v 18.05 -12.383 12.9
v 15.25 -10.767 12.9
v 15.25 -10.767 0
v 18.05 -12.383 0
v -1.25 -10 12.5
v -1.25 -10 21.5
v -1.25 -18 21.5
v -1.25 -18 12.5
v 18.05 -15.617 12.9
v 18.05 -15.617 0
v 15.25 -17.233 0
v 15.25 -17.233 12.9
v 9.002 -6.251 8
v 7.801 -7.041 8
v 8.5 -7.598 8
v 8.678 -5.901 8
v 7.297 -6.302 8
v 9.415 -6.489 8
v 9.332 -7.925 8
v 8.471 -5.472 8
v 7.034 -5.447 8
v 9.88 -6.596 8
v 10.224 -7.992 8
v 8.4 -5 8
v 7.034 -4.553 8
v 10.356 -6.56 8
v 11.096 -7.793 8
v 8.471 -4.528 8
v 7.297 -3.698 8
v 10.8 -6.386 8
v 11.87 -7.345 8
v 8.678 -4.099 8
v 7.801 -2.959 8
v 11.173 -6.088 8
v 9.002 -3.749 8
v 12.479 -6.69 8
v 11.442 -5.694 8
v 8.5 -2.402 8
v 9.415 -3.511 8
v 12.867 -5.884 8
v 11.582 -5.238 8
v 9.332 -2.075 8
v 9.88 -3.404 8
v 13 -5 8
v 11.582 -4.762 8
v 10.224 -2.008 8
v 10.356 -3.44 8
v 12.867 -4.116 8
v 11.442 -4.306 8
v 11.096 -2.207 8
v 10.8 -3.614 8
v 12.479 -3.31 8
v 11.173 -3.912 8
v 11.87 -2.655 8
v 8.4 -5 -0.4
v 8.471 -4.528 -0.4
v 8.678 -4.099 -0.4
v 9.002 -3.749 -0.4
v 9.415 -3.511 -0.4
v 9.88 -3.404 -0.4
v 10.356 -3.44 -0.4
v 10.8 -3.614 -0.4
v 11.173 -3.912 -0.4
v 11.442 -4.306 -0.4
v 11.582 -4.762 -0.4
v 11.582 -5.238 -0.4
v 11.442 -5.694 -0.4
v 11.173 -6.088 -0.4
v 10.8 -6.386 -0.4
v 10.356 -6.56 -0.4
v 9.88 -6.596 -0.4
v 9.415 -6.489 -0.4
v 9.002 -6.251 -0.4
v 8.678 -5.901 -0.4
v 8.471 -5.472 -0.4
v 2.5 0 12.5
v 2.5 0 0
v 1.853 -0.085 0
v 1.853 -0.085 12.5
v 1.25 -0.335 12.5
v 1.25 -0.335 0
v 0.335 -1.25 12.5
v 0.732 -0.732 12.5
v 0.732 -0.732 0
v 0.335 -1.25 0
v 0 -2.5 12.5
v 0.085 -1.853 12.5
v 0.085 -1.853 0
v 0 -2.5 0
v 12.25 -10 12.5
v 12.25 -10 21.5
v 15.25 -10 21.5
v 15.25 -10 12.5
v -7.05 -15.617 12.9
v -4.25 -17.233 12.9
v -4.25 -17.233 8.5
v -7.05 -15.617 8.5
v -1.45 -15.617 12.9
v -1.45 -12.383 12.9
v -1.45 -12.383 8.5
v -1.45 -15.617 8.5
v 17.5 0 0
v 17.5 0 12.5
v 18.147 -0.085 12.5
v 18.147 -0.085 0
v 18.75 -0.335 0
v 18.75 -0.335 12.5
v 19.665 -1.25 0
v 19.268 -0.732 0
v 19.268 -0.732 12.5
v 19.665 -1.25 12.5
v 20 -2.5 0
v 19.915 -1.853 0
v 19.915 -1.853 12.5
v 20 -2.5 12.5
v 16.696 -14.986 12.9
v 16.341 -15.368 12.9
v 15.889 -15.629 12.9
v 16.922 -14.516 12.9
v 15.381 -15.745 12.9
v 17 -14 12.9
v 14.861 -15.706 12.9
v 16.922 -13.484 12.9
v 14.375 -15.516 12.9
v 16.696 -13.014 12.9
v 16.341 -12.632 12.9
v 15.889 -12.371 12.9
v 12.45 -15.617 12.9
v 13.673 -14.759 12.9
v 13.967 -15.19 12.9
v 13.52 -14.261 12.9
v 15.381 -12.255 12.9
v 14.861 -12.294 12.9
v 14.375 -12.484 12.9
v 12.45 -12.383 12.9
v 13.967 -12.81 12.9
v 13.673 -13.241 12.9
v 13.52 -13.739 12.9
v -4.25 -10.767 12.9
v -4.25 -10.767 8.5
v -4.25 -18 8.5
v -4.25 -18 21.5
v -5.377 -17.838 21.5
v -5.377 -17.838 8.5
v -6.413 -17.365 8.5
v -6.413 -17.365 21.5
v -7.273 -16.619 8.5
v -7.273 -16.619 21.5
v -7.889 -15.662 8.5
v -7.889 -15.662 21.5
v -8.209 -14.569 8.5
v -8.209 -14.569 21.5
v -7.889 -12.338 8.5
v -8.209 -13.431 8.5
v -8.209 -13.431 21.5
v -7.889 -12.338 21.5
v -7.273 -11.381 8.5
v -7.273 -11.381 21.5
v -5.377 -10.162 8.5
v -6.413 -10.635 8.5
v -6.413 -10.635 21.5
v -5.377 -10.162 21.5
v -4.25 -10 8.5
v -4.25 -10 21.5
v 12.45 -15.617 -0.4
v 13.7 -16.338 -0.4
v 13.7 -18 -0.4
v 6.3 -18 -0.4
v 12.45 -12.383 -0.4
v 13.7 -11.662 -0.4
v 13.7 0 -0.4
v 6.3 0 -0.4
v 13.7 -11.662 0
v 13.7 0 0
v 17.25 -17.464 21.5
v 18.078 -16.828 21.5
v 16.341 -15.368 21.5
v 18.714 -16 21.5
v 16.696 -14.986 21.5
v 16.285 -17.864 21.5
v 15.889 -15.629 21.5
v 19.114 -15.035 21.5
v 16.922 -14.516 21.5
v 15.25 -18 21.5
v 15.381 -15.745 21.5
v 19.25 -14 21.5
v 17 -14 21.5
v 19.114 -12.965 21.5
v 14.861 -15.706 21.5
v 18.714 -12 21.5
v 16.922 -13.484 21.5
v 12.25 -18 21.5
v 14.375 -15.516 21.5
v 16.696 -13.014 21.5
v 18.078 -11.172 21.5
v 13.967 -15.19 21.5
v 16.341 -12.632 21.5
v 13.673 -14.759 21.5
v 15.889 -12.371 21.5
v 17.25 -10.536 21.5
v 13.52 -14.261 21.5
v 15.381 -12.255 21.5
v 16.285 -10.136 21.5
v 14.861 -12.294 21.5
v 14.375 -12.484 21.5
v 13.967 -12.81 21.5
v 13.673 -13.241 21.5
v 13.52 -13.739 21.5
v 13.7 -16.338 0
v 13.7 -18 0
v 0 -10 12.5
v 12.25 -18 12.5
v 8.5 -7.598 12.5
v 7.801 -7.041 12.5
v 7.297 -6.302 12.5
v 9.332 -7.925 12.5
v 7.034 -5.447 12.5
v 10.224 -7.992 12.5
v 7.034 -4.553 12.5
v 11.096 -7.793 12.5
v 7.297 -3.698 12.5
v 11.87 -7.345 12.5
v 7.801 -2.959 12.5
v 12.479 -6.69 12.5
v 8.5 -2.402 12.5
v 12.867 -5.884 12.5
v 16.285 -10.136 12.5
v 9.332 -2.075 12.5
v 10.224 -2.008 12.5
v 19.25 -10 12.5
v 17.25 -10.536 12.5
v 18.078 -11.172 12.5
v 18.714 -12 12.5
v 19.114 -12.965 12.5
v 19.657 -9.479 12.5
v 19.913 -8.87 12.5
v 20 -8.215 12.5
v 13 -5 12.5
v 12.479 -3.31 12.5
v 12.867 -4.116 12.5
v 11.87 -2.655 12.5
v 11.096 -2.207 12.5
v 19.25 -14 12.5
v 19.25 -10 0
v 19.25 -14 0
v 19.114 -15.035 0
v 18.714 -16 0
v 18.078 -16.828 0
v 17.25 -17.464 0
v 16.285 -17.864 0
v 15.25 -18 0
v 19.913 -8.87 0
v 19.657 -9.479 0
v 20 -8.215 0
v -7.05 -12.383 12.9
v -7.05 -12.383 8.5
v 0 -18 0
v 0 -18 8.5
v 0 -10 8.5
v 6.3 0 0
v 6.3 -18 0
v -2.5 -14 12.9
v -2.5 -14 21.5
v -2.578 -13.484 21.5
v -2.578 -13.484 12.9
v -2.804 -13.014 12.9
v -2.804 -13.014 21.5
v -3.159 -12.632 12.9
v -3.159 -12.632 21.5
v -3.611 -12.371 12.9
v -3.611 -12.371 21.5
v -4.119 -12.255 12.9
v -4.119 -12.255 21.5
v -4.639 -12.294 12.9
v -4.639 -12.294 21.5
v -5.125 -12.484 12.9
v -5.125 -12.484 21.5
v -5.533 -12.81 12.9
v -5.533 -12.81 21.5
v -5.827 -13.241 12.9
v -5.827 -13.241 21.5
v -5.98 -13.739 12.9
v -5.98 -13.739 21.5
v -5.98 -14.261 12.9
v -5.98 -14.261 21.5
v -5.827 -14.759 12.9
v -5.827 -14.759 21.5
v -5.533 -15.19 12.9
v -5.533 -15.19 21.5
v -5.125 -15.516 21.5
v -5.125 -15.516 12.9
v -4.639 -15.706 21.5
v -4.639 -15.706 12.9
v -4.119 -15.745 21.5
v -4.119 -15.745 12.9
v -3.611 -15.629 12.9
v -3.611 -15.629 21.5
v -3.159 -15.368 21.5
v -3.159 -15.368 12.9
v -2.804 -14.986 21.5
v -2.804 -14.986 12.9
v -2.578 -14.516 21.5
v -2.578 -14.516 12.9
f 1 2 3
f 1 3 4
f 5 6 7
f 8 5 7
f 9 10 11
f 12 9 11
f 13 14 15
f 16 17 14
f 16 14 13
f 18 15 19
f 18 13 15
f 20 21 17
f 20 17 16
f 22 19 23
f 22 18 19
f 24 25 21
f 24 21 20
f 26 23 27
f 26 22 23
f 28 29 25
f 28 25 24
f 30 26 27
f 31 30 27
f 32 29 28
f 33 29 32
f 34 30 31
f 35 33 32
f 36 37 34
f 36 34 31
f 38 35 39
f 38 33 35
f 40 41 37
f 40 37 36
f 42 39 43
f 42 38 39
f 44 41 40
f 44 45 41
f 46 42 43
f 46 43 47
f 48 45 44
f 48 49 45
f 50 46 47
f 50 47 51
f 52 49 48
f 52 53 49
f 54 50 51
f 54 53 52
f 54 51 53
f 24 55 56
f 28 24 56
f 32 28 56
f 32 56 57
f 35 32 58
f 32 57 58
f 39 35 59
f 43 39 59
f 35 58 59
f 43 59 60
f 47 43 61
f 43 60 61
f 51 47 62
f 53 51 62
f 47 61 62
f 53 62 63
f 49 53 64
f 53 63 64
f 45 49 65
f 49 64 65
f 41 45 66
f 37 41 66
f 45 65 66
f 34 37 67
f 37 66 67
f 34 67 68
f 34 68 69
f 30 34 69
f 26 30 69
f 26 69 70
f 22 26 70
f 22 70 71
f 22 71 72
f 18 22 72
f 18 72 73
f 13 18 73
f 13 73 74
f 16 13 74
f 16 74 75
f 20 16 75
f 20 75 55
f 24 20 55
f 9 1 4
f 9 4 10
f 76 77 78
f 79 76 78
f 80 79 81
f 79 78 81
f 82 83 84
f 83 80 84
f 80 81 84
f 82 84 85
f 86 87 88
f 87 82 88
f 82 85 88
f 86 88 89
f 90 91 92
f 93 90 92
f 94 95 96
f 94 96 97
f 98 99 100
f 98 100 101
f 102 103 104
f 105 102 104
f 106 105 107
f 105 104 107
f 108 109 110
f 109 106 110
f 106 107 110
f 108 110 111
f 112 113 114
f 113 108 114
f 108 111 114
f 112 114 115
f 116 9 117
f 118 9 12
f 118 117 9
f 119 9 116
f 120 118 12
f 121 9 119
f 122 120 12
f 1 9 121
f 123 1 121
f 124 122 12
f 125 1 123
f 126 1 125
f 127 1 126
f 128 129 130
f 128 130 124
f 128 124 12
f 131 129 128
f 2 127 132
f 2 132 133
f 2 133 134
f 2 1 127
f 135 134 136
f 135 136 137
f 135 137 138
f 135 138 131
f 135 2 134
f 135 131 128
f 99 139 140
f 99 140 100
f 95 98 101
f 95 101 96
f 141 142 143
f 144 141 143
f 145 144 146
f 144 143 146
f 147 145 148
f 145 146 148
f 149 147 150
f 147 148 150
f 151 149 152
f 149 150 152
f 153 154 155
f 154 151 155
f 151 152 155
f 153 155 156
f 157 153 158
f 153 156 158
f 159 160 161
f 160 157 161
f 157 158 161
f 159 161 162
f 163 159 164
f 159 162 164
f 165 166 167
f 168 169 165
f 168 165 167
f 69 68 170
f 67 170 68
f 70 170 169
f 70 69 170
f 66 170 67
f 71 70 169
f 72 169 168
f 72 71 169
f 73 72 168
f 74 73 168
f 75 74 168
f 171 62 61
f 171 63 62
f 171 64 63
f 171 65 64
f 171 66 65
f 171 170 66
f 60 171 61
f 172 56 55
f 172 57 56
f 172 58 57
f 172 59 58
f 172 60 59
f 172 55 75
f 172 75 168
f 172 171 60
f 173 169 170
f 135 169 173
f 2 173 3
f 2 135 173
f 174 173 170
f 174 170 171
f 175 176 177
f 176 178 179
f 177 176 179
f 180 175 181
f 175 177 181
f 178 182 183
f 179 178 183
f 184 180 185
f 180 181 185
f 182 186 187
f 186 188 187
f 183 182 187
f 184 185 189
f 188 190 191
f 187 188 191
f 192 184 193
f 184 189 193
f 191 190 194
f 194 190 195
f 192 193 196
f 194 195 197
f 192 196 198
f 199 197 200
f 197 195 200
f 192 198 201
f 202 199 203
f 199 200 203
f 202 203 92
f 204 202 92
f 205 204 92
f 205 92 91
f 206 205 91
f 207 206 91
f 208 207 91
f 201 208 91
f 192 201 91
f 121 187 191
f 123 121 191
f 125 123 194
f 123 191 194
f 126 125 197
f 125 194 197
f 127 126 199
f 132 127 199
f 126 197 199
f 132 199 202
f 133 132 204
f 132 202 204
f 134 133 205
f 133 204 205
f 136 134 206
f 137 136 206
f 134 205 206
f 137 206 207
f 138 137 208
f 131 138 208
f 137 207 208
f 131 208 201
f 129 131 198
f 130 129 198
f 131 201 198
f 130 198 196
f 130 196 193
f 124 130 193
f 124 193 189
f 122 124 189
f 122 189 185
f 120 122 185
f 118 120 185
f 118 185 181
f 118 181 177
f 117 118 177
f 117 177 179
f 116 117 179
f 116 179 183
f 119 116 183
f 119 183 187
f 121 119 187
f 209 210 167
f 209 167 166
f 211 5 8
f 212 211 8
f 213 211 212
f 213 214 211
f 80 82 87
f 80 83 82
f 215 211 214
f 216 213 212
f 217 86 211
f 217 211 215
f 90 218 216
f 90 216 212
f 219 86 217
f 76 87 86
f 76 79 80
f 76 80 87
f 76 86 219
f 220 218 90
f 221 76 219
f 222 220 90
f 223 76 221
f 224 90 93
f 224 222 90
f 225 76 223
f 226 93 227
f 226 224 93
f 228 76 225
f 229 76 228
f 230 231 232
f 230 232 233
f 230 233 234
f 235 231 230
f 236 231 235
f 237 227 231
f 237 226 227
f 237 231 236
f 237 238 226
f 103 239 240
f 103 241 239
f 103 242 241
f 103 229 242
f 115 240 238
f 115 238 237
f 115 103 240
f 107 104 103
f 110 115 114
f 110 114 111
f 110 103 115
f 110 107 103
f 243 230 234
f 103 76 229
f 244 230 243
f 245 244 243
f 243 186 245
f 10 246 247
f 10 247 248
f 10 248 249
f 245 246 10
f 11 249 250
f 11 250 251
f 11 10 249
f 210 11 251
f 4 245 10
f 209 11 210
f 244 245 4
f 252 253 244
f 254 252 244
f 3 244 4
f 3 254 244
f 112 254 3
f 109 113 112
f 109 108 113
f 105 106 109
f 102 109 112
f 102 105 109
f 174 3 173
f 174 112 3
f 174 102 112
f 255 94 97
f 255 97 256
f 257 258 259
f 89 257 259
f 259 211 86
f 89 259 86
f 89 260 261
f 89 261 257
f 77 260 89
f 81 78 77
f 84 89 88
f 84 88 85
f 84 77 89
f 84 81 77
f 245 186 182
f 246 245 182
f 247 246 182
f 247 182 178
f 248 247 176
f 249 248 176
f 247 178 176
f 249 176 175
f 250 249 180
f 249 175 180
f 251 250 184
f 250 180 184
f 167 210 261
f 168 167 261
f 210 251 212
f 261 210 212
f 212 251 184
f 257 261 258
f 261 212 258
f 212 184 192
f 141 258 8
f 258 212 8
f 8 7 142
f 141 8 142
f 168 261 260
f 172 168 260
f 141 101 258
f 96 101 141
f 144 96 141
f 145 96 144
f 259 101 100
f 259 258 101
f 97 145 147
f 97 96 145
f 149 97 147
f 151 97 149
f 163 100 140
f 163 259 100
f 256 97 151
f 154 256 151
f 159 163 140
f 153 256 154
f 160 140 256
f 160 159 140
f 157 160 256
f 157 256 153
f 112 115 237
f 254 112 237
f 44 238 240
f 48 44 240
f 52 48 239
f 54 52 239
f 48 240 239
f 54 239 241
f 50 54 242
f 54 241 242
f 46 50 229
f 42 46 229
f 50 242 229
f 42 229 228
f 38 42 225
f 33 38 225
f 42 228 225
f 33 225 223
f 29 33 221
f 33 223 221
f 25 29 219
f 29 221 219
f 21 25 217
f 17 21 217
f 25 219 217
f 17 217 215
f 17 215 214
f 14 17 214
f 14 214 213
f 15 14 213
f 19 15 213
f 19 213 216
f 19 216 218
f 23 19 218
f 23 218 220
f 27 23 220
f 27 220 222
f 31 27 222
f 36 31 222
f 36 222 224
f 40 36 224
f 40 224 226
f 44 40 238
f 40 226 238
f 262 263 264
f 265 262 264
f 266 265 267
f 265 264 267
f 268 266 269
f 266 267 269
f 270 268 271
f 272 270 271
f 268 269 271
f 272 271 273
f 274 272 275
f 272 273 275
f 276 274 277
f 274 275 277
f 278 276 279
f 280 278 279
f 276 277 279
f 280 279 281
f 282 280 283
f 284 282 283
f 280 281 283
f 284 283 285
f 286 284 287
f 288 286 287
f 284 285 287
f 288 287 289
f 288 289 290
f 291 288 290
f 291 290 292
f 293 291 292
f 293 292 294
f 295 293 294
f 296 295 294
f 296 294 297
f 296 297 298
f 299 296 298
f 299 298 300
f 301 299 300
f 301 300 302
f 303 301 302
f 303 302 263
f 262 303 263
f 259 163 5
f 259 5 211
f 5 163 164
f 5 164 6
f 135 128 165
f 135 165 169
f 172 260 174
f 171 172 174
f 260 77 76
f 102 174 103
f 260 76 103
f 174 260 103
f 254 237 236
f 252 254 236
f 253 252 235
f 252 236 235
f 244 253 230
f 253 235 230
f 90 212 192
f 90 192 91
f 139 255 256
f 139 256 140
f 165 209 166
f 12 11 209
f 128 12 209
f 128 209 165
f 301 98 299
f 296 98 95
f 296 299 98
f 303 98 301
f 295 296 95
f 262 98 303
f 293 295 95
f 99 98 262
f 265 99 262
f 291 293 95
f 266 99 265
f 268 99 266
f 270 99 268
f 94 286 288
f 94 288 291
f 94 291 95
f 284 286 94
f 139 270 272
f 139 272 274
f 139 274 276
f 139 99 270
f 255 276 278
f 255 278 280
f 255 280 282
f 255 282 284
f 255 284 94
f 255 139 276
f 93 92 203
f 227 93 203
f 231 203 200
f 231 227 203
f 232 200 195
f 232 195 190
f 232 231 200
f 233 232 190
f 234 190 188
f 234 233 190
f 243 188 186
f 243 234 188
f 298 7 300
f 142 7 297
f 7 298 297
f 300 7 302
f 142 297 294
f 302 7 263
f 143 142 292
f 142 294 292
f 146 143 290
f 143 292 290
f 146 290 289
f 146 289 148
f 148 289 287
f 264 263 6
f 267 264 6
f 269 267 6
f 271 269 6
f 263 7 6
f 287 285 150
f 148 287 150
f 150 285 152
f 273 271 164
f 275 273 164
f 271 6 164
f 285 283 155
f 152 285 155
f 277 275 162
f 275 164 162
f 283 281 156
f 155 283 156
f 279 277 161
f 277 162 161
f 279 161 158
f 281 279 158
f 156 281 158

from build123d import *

# Parameters (mm, degrees)
SKETCH_1_W               = 20
SKETCH_1_H               = 10
EXTRUDE_1_DEPTH          = 8.5
EXTRUDE_3_DEPTH          = 8.5
EXTRUDE_3_DEPTH_BACK     = 13
CUT_EXTRUDE_1_DEPTH      = 9
SKETCH_11_W              = 7.4
SKETCH_11_H              = 18
EXTRUDE_5_DEPTH          = 0.4
SKETCH_14_W              = 13
SKETCH_14_H              = 8.5
CUT_EXTRUDE_7_DEPTH      = 8
SKETCH_6_R               = 1.75
CUT_EXTRUDE_2_DEPTH      = 12.8
CUT_EXTRUDE_3_DEPTH      = 35.441980199
CUT_EXTRUDE_3_DEPTH_BACK = 12.9
SKETCH_15_W              = 3.5
SKETCH_15_H              = 8
CUT_EXTRUDE_8_DEPTH      = 8.5
SKETCH_12_R              = 1.6
CUT_EXTRUDE_4_DEPTH      = 35.693082884
SKETCH_13_R              = 3
CUT_EXTRUDE_5_DEPTH      = 4.5
FILLET_1_R               = 2.5
FILLET_2_R               = 4


# Some blends are built 0.0001 mm under size
with BuildPart() as part:
    # Эскиз1 → Бобышка-Вытянуть1 (new body)
    with BuildSketch(Plane.XY):
        with Locations((10, -5)):
            Rectangle(SKETCH_1_W, SKETCH_1_H)
    extrude(amount=EXTRUDE_1_DEPTH)

    # Эскиз4 → Бобышка-Вытянуть3 (add, two sides: drawn at the far end of the back side and taken through both)
    with BuildSketch(Plane(origin=(0, 0, 8.5), x_dir=(-1, 0, 0), z_dir=(0, 0, -1)).offset(-EXTRUDE_3_DEPTH_BACK)):
        with BuildLine():
            Line((4.25, -10), (0, -10))
            Line((0, -10), (0, 0))
            Line((0, 0), (-20, 0))
            Line((-20, 0), (-20, -10))
            Line((-20, -10), (-19.25, -10))
            Line((-19.25, -10), (-19.25, -14))
            ThreePointArc((-19.25, -14), (-18.078427125, -16.828427125), (-15.25, -18))
            Line((-15.25, -18), (4.25, -18))
            ThreePointArc((4.25, -18), (8.25, -14), (4.25, -10))
        make_face()
    extrude(amount=EXTRUDE_3_DEPTH + EXTRUDE_3_DEPTH_BACK)

    # Эскиз5 → Вырез-Вытянуть1 (cut)
    with BuildSketch(Plane.XY.offset(21.5)):
        Polygon((-1.25, -10), (-1.25, -18), (12.25, -18), (12.25, -10), (20, -10), (20, 0), (0, 0), (0, -10), align=None)
    extrude(amount=-CUT_EXTRUDE_1_DEPTH, mode=Mode.SUBTRACT)

    # Эскиз11 → Бобышка-Вытянуть5 (add)
    with BuildSketch(Plane(origin=(0, 0, 0), x_dir=(-1, 0, 0), z_dir=(0, 0, -1))):
        with Locations((-10, -9)):
            Rectangle(SKETCH_11_W, SKETCH_11_H)
    extrude(amount=EXTRUDE_5_DEPTH)

    # Эскиз14 → Вырез-Вытянуть7 (cut)
    with BuildSketch(Plane(origin=(9.75, -18, 0), x_dir=(-1, 0, 0), z_dir=(0, 1, 0))):
        with Locations((19.75, 4.25)):
            Rectangle(SKETCH_14_W, SKETCH_14_H)
    extrude(amount=CUT_EXTRUDE_7_DEPTH, mode=Mode.SUBTRACT)

    # Эскиз6 → Вырез-Вытянуть2 (cut)
    with BuildSketch(Plane.XY.offset(21.5)):
        with Locations((-4.25, -14)):
            Circle(SKETCH_6_R)
        with Locations((15.25, -14)):
            Circle(SKETCH_6_R)
    extrude(amount=-CUT_EXTRUDE_2_DEPTH, mode=Mode.SUBTRACT)

    # Эскиз7 → Вырез-Вытянуть3 (cut, two sides: drawn at the far end of the back side and taken through both)
    with BuildSketch(Plane(origin=(0, 0, 0), x_dir=(-1, 0, 0), z_dir=(0, 0, -1)).offset(-CUT_EXTRUDE_3_DEPTH_BACK)):
        Polygon((-15.25, -10.766838493), (-18.05, -12.383419246), (-18.05, -15.616580754), (-15.25, -17.233161507), (-12.45, -15.616580754), (-12.45, -12.383419246), align=None)
        Polygon((4.25, -10.766838493), (1.45, -12.383419246), (1.45, -15.616580754), (4.25, -17.233161507), (7.05, -15.616580754), (7.05, -12.383419246), align=None)
    extrude(amount=CUT_EXTRUDE_3_DEPTH + CUT_EXTRUDE_3_DEPTH_BACK, mode=Mode.SUBTRACT)

    # Эскиз15 → Вырез-Вытянуть8 (cut)
    with BuildSketch(Plane(origin=(0, 0, 0), x_dir=(-1, 0, 0), z_dir=(0, 0, -1))):
        with Locations((1.75, -14)):
            Rectangle(SKETCH_15_W, SKETCH_15_H)
    extrude(amount=-CUT_EXTRUDE_8_DEPTH, mode=Mode.SUBTRACT)

    # Эскиз12 → Вырез-Вытянуть4 (cut, through all)
    with BuildSketch(Plane(origin=(0, 0, -0.4), x_dir=(-1, 0, 0), z_dir=(0, 0, -1))):
        with Locations((-10, -5)):
            Circle(SKETCH_12_R)
    extrude(amount=-CUT_EXTRUDE_4_DEPTH, mode=Mode.SUBTRACT)

    # Эскиз13 → Вырез-Вытянуть5 (cut)
    with BuildSketch(Plane.XY.offset(12.5)):
        with Locations((10, -5)):
            Circle(SKETCH_13_R)
    extrude(amount=-CUT_EXTRUDE_5_DEPTH, mode=Mode.SUBTRACT)

    # Скругление1
    # the kernel refuses this fillet: 2.5 mm, written as the material it takes off along each edge
    with BuildSketch(Plane(origin=(0, 0, -6.25), x_dir=(1, 0, 0), z_dir=(0, 0, 1)), Plane(origin=(20, 0, 18.75), x_dir=(-1, 0, 0), z_dir=(0, 0, -1))) as fillet_1_piece_1:
        with BuildLine():
            CenterArc((FILLET_1_R, -FILLET_1_R), FILLET_1_R, 90, 90)
            Line((0, -FILLET_1_R), (-FILLET_1_R * 0.02, -FILLET_1_R))
            Line((-FILLET_1_R * 0.02, -FILLET_1_R), (-FILLET_1_R * 0.02, FILLET_1_R * 0.02))
            Line((-FILLET_1_R * 0.02, FILLET_1_R * 0.02), (FILLET_1_R, FILLET_1_R * 0.02))
            Line((FILLET_1_R, FILLET_1_R * 0.02), (FILLET_1_R, 0))
        make_face()
    extrude(amount=25, mode=Mode.SUBTRACT)
    with BuildSketch(Plane(origin=(20, -10, 16.963392768), x_dir=(0, 1, 0), z_dir=(0, 0, -1))) as fillet_1_piece_2:
        with BuildLine():
            CenterArc((1.785357107, -2.5), FILLET_1_R, 90, 45.572995999)
            Line((0, -0.75), (-0.035707142, -0.715))
            ThreePointArc((-0.035707142, -0.715), (-0.05, -0.375), (-0.05, 0))
            Line((-0.05, 0), (0, 0.05))
            Line((0, 0.05), (1.785357107, 0.05))
            Line((1.785357107, 0.05), (1.785357107, 0))
        make_face()
    extrude(amount=21.426785536, mode=Mode.SUBTRACT)

    # Скругление2
    fillet_2_edges = [part.edges().sort_by_distance(p)[0] for p in [
        (19.25, -10, 17),
    ]]
    fillet(fillet_2_edges, radius=FILLET_2_R - 0.0001)  # a hair under: the kernel refuses the full size


solid = part.part
